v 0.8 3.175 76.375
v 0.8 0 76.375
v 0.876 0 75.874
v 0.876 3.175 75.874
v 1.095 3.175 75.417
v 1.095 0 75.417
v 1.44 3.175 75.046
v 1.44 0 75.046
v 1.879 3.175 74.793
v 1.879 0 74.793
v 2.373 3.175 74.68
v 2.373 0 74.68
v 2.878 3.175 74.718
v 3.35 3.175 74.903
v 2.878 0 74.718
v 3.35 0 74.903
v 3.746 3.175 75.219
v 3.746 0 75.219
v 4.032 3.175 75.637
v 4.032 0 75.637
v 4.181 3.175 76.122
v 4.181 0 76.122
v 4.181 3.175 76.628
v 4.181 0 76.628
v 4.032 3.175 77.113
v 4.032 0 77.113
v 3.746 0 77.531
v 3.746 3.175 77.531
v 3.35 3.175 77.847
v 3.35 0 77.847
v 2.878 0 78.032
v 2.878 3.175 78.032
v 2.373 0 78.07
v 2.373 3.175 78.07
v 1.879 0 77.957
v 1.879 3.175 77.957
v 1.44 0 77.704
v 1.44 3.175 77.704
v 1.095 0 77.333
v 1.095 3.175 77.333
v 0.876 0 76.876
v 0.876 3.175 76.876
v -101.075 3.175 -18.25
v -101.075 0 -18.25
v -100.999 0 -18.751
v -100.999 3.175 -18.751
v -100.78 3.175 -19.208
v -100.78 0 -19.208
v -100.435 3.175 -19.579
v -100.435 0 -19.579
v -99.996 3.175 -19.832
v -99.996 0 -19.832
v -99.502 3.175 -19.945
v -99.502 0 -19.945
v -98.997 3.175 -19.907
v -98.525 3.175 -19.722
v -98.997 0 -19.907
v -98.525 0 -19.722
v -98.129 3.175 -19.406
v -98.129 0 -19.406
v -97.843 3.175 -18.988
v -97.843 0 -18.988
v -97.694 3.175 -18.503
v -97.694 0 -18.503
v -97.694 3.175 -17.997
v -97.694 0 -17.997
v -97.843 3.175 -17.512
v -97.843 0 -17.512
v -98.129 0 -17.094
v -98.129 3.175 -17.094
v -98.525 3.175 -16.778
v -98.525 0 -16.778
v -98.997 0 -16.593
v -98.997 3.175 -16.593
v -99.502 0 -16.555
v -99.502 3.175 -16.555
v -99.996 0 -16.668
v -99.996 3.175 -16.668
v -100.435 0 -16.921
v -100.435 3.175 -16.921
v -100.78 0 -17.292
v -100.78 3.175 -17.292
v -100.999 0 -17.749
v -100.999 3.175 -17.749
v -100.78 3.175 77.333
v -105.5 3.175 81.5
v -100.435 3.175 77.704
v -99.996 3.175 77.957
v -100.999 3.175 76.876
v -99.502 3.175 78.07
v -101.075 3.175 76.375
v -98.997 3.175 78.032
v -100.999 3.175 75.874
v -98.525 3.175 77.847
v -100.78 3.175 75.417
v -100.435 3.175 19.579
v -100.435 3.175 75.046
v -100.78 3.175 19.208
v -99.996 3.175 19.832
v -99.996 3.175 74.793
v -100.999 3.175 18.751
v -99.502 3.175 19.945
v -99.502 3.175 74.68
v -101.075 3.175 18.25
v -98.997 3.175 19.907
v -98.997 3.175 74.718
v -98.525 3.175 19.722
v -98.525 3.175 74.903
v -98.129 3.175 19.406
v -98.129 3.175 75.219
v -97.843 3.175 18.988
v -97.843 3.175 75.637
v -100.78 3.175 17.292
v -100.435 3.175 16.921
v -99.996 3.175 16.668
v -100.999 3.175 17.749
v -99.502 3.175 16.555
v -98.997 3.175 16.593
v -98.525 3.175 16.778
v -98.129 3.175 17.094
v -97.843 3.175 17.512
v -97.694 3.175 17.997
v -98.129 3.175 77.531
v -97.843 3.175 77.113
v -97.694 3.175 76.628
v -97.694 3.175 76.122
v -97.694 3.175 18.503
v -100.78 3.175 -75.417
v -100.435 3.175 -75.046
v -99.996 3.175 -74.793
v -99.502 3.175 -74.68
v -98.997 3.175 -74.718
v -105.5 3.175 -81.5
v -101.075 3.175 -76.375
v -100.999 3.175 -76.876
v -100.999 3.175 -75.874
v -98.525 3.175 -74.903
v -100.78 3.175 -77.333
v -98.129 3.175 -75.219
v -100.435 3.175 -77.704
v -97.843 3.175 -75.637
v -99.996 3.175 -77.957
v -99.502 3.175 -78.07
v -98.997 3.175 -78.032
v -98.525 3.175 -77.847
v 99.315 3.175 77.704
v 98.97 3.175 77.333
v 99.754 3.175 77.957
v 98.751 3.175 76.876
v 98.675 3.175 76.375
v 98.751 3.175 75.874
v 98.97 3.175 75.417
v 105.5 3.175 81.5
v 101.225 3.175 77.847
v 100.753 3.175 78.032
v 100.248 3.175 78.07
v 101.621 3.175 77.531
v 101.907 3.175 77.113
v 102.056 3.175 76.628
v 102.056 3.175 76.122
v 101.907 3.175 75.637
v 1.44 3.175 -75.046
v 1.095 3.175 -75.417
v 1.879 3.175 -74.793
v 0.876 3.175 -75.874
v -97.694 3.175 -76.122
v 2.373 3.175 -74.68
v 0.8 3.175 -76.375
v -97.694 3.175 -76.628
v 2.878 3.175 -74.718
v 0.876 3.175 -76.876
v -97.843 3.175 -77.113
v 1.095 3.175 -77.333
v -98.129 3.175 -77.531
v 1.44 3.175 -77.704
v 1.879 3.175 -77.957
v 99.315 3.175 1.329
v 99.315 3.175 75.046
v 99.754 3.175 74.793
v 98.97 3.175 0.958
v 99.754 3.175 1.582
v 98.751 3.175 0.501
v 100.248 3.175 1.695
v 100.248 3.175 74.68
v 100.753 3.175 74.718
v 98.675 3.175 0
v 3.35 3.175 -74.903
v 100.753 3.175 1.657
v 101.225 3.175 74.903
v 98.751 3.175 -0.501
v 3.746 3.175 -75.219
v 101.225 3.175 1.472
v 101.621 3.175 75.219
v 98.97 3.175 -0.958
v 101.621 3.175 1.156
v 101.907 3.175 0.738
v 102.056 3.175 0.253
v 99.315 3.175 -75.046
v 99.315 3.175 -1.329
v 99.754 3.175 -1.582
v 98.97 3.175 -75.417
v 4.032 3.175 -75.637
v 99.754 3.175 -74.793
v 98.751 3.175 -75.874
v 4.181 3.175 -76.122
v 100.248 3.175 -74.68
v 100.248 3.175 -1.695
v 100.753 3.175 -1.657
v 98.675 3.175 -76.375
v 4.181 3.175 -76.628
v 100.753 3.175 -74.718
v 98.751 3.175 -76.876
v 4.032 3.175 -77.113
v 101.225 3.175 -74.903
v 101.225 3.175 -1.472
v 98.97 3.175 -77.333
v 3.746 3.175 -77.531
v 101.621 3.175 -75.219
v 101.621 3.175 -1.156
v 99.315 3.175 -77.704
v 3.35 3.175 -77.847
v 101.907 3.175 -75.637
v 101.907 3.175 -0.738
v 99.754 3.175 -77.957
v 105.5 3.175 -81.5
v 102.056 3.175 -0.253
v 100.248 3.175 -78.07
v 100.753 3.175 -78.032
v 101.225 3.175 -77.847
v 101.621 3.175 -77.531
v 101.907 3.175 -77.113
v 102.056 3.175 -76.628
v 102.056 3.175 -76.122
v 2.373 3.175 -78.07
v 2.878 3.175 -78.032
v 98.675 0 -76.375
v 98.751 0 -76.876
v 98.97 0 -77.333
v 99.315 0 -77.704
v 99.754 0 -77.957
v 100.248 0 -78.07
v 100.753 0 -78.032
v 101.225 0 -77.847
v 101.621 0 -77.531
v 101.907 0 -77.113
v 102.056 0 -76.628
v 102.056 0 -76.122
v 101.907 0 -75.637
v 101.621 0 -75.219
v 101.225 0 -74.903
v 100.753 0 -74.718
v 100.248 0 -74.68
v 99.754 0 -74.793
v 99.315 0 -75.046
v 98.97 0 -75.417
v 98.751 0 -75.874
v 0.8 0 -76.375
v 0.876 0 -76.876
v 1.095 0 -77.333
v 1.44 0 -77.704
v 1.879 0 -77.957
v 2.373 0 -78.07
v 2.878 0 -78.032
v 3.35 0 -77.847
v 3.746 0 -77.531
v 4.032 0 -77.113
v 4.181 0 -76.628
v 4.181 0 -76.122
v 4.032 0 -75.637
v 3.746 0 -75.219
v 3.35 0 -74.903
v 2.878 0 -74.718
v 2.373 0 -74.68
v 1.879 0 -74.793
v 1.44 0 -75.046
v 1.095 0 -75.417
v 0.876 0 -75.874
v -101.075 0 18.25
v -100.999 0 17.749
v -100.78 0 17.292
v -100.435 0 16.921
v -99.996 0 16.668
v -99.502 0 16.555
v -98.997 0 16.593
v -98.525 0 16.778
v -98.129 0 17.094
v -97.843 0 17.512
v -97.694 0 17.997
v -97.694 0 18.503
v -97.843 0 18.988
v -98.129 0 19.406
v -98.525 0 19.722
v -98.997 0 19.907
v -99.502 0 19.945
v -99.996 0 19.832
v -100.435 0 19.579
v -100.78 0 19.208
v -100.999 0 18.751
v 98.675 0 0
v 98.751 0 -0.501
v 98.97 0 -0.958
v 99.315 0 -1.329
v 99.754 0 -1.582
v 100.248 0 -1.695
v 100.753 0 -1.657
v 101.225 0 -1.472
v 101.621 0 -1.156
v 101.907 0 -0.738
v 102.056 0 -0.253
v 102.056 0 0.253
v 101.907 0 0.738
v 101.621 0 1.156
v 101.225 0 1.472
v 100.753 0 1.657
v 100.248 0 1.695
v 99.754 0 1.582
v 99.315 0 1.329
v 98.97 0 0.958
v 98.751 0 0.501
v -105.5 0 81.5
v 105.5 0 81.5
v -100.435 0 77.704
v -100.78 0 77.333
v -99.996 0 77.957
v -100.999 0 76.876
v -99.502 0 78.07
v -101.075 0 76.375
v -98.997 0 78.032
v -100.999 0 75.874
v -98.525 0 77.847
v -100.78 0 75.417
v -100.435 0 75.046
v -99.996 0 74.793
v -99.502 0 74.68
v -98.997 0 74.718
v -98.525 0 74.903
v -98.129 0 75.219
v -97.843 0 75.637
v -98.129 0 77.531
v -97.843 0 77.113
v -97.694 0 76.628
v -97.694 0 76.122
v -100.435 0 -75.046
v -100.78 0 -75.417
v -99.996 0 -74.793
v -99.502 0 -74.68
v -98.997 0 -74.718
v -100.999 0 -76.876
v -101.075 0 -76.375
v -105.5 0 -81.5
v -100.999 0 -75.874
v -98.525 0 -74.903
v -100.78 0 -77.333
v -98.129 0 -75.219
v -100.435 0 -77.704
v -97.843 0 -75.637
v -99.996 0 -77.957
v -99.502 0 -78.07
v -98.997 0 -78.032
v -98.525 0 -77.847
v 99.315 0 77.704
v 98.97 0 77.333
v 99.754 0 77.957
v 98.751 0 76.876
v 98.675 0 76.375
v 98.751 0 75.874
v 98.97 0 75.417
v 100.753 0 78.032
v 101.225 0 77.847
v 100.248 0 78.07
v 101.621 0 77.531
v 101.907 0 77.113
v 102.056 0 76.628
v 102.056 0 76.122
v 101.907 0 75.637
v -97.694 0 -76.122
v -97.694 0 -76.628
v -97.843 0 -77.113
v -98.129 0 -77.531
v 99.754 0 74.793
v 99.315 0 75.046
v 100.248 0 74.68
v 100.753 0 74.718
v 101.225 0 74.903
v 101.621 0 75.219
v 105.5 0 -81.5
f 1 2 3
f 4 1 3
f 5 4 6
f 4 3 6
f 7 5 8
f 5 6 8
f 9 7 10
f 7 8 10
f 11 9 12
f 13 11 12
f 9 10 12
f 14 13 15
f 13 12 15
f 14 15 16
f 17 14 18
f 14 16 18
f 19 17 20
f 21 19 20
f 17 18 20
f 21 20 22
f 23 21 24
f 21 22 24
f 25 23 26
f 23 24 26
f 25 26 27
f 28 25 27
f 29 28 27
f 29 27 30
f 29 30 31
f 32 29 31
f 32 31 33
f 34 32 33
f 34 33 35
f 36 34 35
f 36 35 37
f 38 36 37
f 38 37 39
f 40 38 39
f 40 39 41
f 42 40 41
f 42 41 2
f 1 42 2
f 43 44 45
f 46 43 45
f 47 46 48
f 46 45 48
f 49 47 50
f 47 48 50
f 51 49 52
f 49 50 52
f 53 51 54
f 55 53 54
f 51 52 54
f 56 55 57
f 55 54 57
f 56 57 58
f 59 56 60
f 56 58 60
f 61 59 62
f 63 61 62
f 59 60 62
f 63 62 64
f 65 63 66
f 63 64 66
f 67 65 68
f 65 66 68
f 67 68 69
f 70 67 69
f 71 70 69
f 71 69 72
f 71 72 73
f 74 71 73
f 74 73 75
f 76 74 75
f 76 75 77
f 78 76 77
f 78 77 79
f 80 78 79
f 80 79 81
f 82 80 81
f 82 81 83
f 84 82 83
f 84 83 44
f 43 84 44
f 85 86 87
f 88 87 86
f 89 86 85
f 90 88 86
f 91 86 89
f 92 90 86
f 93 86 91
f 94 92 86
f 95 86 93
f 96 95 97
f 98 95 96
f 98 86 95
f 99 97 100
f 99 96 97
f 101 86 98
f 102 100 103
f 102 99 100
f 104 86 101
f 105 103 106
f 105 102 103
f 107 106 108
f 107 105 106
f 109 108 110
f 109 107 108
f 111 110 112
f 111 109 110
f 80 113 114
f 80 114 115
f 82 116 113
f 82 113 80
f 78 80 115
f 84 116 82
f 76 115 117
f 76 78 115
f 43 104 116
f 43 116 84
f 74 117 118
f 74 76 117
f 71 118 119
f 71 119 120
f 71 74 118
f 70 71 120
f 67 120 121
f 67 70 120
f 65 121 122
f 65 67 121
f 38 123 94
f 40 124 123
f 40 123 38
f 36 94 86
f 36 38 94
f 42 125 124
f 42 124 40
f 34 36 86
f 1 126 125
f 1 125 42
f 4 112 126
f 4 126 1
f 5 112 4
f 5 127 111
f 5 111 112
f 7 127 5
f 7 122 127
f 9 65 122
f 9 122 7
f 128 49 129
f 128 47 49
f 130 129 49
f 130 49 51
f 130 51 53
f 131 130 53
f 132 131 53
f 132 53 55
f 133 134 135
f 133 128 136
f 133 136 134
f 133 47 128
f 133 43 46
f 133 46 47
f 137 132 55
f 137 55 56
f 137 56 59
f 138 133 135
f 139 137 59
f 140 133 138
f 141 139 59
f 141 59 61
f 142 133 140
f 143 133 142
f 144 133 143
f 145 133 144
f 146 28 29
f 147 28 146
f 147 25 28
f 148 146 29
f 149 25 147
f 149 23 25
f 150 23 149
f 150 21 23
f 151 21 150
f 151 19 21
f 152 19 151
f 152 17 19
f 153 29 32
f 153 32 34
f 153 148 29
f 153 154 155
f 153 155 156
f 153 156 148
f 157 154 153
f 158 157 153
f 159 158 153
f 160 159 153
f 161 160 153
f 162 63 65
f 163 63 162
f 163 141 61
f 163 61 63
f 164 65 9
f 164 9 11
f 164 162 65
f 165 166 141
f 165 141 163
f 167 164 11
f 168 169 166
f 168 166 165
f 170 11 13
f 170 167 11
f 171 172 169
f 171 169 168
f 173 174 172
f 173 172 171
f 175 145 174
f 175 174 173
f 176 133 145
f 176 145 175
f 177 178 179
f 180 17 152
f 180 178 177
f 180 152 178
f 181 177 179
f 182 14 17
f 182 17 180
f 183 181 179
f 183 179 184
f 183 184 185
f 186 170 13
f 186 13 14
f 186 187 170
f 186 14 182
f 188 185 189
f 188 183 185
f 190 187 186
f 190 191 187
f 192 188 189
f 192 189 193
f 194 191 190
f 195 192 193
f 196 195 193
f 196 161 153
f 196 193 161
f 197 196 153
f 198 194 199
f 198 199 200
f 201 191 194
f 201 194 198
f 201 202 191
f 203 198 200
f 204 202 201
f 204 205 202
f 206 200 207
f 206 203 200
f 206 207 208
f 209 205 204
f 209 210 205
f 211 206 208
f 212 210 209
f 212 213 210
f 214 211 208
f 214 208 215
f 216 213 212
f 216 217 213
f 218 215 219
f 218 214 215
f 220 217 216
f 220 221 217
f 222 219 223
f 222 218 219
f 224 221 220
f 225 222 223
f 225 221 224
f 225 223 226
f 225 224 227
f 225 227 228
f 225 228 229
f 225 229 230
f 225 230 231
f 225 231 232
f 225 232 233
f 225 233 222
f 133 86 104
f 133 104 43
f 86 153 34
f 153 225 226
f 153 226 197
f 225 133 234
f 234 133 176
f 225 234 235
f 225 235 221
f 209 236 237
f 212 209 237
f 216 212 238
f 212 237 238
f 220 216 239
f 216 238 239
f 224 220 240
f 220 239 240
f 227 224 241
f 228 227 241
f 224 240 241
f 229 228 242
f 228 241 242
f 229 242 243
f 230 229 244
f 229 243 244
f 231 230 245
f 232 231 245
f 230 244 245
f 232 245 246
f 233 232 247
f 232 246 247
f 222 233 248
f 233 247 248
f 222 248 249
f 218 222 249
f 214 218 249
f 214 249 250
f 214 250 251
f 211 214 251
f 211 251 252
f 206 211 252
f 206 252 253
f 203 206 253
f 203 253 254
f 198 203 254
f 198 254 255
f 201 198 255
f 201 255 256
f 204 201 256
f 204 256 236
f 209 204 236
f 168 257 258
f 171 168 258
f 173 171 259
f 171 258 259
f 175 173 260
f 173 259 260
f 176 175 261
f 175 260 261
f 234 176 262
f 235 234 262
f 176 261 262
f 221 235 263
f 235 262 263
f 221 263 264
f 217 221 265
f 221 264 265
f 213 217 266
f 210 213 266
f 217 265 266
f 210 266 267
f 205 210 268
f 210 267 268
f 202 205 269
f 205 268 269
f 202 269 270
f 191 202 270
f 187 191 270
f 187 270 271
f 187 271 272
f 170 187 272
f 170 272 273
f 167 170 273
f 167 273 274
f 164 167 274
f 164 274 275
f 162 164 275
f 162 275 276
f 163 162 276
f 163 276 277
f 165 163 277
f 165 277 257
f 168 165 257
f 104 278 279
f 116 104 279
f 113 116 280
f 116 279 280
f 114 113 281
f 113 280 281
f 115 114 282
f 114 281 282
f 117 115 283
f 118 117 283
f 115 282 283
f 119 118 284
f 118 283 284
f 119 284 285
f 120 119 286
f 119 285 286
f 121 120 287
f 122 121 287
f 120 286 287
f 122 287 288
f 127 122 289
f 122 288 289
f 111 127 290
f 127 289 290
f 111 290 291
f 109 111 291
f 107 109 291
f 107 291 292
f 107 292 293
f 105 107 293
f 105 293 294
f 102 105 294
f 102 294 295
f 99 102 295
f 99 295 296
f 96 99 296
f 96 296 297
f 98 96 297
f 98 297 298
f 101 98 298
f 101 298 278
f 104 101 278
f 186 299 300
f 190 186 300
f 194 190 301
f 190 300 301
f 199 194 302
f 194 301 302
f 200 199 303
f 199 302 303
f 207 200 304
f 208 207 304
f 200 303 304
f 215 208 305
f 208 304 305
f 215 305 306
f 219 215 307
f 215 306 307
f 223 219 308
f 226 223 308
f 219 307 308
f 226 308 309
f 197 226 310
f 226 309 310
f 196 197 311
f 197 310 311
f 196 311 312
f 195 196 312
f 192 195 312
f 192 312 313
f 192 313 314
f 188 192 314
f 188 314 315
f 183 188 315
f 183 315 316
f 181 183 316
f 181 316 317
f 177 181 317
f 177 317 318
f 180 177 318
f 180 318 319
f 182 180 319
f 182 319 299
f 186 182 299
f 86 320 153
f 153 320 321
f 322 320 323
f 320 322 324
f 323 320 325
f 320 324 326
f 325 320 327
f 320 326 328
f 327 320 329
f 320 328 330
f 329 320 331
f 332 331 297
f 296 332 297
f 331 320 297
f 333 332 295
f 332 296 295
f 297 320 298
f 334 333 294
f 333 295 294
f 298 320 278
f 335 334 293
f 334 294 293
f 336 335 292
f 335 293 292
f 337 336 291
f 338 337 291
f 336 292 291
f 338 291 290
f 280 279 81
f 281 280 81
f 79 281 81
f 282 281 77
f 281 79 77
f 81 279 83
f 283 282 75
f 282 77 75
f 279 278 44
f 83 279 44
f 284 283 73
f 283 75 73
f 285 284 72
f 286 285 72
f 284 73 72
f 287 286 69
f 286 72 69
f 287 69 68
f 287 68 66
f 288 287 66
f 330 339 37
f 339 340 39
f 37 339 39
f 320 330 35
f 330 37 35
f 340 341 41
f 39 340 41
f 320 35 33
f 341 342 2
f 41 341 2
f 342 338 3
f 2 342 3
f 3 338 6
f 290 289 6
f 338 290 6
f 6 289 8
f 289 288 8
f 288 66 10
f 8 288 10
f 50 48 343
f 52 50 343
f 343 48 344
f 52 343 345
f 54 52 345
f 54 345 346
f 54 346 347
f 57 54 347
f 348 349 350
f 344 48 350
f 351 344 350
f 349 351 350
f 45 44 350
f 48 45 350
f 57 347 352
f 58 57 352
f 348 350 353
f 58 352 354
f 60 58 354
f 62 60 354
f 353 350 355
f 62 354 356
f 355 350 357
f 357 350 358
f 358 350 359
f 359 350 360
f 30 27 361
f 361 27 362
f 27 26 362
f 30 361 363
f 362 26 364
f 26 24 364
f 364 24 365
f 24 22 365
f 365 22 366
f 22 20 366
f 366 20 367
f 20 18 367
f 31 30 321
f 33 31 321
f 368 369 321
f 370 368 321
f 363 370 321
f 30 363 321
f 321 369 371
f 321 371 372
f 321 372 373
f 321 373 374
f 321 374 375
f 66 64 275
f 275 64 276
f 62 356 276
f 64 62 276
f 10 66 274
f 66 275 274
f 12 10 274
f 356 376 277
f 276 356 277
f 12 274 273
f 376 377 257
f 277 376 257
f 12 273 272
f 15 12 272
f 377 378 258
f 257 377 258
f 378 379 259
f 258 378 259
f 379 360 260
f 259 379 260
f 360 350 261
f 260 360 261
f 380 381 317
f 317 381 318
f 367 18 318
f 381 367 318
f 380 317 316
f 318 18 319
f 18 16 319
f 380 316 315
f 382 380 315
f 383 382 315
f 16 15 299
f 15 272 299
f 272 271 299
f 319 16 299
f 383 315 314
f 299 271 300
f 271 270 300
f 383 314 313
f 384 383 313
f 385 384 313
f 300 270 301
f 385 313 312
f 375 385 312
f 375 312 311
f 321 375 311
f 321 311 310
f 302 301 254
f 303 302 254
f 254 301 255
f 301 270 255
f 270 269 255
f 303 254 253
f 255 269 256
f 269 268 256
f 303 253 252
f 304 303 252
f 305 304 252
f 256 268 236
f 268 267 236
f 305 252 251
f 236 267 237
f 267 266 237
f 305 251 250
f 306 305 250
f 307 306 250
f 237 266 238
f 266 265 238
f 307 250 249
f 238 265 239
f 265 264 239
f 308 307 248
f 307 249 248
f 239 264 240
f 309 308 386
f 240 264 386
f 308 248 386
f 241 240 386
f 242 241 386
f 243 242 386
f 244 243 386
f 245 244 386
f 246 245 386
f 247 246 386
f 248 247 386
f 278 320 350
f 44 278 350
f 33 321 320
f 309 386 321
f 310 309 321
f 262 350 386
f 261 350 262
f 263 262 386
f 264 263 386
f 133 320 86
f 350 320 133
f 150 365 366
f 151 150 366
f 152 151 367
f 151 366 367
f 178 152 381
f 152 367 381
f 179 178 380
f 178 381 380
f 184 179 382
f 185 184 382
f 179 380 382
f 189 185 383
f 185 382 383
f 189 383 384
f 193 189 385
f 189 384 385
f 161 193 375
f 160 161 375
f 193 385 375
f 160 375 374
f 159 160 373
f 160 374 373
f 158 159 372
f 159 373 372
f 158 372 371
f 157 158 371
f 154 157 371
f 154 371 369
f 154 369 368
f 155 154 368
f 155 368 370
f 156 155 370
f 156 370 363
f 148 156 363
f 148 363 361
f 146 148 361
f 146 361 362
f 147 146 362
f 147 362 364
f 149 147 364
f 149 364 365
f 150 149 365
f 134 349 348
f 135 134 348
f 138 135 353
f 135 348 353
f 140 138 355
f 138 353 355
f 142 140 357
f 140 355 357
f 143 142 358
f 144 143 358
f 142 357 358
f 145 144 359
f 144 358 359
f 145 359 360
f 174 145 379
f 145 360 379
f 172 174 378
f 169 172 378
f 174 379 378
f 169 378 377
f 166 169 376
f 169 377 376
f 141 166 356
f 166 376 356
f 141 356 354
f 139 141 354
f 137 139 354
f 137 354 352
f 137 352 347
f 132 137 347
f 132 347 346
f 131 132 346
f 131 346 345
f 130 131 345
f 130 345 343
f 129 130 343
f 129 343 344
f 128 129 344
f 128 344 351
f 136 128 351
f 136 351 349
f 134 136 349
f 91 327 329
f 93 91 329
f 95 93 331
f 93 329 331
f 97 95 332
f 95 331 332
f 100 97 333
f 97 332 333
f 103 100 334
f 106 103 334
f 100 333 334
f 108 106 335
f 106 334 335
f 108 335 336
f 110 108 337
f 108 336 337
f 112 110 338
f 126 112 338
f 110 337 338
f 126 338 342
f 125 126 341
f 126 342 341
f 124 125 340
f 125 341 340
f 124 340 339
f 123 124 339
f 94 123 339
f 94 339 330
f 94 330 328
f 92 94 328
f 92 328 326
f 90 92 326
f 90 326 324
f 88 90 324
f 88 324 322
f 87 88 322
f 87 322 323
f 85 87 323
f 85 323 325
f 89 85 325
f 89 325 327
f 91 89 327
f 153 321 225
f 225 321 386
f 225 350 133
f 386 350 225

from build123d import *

# Parameters (mm, degrees)
SKETCH1_W           = 211
SKETCH1_H           = 163
BOSS_EXTRUDE1_DEPTH = 3.175
SKETCH2_R           = 1.7
CUT_EXTRUDE1_DEPTH  = 4.175


with BuildPart() as part:
    # Sketch1 → Boss-Extrude1 (new body)
    with BuildSketch(Plane(origin=(0, 0, 0), x_dir=(1, 0, 0), z_dir=(0, 1, 0))):
        Rectangle(SKETCH1_W, SKETCH1_H)
    extrude(amount=BOSS_EXTRUDE1_DEPTH)

    # Sketch2 → Cut-Extrude1 (cut, through all)
    with BuildSketch(Plane(origin=(0, 0, 0), x_dir=(-1, 0, 0), z_dir=(0, -1, 0))):
        with Locations((99.375, -76.375)):
            Circle(SKETCH2_R)
        with Locations((-2.5, -76.375)):
            Circle(SKETCH2_R)
        with Locations((-100.375, -76.375)):
            Circle(SKETCH2_R)
        with Locations((-100.375, 0)):
            Circle(SKETCH2_R)
        with Locations((-100.375, 76.375)):
            Circle(SKETCH2_R)
        with Locations((-2.5, 76.375)):
            Circle(SKETCH2_R)
        with Locations((99.375, 76.375)):
            Circle(SKETCH2_R)
        with Locations((99.375, 18.25)):
            Circle(SKETCH2_R)
        with Locations((99.375, -18.25)):
            Circle(SKETCH2_R)
    extrude(amount=-CUT_EXTRUDE1_DEPTH, mode=Mode.SUBTRACT)


solid = part.part
